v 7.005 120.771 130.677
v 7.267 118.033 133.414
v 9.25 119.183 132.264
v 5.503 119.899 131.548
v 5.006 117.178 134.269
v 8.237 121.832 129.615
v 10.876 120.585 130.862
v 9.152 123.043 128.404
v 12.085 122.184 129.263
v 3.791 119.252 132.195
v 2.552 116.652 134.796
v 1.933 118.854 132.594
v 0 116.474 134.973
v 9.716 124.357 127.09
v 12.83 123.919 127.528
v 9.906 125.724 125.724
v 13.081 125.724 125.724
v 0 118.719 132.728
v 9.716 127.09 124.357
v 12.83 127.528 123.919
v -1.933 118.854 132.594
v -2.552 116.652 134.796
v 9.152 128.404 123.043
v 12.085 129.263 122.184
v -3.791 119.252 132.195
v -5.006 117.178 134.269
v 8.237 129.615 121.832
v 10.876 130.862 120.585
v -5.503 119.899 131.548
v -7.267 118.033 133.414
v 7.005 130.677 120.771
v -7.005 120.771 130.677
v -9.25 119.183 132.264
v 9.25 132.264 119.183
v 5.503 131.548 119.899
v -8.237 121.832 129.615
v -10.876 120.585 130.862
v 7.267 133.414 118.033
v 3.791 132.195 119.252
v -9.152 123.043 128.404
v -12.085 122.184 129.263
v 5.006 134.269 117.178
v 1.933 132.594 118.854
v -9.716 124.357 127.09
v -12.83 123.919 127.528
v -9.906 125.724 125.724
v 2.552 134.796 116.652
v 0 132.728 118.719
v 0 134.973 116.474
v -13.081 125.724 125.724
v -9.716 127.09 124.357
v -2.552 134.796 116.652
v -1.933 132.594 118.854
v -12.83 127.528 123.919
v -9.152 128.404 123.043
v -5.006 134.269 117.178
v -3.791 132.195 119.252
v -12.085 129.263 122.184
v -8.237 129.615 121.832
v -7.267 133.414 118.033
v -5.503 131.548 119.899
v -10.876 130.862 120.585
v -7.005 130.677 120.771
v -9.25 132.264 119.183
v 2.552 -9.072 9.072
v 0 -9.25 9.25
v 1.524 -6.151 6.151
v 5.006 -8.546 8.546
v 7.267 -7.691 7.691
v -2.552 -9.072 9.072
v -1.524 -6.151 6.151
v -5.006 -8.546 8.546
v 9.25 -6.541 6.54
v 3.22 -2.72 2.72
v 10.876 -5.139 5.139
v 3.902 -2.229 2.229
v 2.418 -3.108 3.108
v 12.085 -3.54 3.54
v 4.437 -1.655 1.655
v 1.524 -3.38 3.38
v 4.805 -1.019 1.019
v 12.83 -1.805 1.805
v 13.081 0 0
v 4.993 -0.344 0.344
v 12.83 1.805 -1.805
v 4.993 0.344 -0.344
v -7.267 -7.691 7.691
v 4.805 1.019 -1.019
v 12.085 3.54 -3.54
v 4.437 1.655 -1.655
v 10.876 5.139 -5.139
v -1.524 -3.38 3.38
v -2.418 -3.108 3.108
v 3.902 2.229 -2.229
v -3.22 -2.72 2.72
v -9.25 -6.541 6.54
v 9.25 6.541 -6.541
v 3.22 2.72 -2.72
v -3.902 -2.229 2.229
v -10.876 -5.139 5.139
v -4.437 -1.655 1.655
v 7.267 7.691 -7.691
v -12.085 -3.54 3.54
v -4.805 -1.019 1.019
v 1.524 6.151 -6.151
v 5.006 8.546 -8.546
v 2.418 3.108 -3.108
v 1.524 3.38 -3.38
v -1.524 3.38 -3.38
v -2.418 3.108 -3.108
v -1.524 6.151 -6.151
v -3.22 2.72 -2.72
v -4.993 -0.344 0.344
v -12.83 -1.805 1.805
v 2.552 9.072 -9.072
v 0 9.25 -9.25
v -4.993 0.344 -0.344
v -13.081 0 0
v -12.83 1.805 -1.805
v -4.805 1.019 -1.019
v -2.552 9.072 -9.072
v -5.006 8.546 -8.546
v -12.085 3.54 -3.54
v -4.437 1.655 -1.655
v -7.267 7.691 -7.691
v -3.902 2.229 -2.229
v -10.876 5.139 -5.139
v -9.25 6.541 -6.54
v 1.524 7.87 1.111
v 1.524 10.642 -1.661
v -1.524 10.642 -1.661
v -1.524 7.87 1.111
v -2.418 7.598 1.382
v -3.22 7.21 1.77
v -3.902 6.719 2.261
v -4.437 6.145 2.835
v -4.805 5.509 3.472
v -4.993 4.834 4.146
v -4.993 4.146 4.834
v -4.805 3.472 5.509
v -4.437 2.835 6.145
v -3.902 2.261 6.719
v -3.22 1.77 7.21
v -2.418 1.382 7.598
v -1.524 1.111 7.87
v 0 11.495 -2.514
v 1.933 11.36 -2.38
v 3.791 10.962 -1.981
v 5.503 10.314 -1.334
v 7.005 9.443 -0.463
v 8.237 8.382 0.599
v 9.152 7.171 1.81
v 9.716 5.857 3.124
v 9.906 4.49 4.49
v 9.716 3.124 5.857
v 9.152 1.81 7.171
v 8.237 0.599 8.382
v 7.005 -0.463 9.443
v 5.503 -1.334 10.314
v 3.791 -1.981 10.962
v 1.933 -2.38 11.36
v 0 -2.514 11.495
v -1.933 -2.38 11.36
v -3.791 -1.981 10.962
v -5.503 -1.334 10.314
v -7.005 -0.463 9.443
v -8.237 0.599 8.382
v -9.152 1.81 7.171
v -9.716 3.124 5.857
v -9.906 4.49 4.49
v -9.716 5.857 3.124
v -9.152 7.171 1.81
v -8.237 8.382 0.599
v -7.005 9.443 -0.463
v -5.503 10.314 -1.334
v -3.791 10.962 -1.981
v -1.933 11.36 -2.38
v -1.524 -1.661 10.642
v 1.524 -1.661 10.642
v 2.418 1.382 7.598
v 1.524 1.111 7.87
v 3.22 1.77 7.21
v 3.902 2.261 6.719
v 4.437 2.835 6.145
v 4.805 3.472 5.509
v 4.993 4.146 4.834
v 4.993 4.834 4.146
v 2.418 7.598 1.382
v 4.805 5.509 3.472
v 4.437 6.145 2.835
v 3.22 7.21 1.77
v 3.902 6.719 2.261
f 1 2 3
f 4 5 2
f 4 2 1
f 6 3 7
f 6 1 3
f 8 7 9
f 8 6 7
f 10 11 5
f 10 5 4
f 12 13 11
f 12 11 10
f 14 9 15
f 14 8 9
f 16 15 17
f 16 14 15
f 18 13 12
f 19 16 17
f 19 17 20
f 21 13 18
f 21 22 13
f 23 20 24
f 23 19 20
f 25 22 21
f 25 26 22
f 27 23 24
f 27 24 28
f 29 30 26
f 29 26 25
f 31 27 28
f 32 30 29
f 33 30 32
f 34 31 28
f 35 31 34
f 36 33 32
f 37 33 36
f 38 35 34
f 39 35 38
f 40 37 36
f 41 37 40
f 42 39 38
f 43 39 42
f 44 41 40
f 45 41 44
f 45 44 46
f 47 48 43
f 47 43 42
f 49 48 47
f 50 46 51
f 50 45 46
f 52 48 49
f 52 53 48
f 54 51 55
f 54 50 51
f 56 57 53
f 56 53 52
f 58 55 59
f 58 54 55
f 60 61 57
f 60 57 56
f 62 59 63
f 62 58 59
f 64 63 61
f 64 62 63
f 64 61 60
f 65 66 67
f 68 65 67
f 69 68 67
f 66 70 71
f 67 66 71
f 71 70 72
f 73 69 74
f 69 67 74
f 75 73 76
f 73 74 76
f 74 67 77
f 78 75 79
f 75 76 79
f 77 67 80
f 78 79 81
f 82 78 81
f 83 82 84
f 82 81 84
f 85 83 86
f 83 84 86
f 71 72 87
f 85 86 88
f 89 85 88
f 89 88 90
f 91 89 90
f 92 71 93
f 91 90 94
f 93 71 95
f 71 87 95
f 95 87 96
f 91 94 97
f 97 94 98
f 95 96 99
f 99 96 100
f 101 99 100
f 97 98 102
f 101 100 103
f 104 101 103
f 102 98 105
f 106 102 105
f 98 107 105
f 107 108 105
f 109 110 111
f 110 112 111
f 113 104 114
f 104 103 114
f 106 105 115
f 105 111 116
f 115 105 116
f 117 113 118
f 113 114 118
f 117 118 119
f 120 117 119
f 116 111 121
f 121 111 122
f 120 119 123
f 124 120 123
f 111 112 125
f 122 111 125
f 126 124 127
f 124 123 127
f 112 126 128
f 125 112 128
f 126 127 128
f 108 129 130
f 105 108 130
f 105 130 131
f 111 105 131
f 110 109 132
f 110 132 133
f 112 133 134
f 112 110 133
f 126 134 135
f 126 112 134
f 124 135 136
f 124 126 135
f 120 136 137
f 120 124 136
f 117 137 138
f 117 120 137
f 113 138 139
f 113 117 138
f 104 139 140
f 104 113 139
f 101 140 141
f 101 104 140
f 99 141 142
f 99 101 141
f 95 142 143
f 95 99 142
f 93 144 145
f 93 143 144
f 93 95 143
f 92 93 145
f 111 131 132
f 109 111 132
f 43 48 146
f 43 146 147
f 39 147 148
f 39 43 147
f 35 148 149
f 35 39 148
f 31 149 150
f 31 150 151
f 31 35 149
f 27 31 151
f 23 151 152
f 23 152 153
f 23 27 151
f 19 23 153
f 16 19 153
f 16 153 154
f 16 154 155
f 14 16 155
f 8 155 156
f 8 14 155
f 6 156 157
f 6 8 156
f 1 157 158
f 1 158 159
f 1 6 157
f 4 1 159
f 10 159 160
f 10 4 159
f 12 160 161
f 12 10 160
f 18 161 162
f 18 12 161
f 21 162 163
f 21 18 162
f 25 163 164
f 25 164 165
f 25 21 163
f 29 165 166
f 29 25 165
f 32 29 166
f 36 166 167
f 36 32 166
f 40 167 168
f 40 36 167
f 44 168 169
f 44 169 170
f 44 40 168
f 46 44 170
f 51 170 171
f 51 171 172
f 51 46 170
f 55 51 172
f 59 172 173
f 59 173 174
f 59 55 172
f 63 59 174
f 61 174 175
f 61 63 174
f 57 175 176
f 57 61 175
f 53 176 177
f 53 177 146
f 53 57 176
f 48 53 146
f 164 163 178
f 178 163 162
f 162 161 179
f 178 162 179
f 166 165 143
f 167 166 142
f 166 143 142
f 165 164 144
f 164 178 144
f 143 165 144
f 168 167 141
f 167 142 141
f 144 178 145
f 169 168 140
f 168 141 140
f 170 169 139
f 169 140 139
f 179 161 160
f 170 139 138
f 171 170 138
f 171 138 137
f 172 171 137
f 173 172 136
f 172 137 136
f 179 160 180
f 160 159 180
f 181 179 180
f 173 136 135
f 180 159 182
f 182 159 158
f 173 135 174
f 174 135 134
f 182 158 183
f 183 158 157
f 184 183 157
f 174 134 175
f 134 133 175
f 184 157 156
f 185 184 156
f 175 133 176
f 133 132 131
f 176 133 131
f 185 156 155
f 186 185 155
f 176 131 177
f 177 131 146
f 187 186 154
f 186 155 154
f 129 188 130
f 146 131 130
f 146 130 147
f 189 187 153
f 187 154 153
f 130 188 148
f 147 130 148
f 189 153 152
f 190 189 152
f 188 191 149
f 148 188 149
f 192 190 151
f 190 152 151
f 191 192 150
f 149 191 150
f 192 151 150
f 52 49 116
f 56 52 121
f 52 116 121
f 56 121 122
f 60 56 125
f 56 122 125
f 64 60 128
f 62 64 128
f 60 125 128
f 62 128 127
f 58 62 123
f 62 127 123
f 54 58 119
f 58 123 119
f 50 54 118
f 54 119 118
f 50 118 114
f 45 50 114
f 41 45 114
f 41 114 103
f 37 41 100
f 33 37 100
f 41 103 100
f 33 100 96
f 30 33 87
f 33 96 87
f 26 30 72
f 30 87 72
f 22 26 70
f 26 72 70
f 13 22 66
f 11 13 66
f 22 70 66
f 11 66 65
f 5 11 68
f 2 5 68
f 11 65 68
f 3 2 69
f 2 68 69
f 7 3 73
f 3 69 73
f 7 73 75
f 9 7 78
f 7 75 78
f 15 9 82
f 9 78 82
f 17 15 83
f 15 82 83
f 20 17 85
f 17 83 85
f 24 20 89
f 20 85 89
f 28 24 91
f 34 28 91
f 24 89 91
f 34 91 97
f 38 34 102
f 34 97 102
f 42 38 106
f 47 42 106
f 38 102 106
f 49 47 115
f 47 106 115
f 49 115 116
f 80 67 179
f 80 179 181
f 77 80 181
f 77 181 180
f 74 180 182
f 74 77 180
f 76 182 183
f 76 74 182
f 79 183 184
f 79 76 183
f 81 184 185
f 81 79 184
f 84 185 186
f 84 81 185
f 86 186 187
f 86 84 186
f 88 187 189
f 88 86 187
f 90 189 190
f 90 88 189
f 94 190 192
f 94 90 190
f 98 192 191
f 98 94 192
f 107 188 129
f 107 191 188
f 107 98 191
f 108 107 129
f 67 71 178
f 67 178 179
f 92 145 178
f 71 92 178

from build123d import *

# Parameters (mm, degrees)
SKETCH9_R           = 13.081
BOSS_EXTRUDE2_DEPTH = 177.8
SKETCH3_R           = 9.906
CUT_EXTRUDE1_DEPTH  = 171.45
CUT_EXTRUDE2_DEPTH  = 206.013596075


with BuildPart() as part:
    # Sketch9 → Boss-Extrude2 (new body)
    with BuildSketch(Plane(origin=(0, 0, 0), x_dir=(1, 0, 0), z_dir=(0, 0.7071067811865464, 0.7071067811865487))):
        with Locations(Location((0, 0, 0), (0, 0, 90))):
            Circle(SKETCH9_R)
    extrude(amount=BOSS_EXTRUDE2_DEPTH)

    # Sketch3 → Cut-Extrude1 (cut)
    with BuildSketch(Plane(origin=(0, 429.24717139, -177.8), x_dir=(1, 0, 0), z_dir=(0, -0.7071067811865464, -0.7071067811865487))):
        with Locations(Location((0, 429.24717139, 0), (0, 0, 270))):
            Circle(SKETCH3_R)
    extrude(amount=CUT_EXTRUDE1_DEPTH, mode=Mode.SUBTRACT)

    # Sketch5 → Cut-Extrude2 (cut, through all)
    with BuildSketch(Plane(origin=(0, 52.076414305, -52.076414305), x_dir=(-1, 0, 0), z_dir=(0, -0.7071067811865464, -0.7071067811865487))):
        with BuildLine():
            Line((-1.524, -64.94767139), (1.524, -64.94767139))
            Line((1.524, -64.94767139), (1.524, -68.867768054))
            ThreePointArc((1.524, -68.867768054), (5.0165, -73.64717139), (1.524, -78.426574726))
            Line((1.524, -78.426574726), (1.524, -82.34667139))
            Line((1.524, -82.34667139), (-1.524, -82.34667139))
            Line((-1.524, -82.34667139), (-1.524, -78.426574726))
            ThreePointArc((-1.524, -78.426574726), (-5.0165, -73.64717139), (-1.524, -68.867768054))
            Line((-1.524, -68.867768054), (-1.524, -64.94767139))
        make_face()
    extrude(amount=-CUT_EXTRUDE2_DEPTH, mode=Mode.SUBTRACT)


solid = part.part
